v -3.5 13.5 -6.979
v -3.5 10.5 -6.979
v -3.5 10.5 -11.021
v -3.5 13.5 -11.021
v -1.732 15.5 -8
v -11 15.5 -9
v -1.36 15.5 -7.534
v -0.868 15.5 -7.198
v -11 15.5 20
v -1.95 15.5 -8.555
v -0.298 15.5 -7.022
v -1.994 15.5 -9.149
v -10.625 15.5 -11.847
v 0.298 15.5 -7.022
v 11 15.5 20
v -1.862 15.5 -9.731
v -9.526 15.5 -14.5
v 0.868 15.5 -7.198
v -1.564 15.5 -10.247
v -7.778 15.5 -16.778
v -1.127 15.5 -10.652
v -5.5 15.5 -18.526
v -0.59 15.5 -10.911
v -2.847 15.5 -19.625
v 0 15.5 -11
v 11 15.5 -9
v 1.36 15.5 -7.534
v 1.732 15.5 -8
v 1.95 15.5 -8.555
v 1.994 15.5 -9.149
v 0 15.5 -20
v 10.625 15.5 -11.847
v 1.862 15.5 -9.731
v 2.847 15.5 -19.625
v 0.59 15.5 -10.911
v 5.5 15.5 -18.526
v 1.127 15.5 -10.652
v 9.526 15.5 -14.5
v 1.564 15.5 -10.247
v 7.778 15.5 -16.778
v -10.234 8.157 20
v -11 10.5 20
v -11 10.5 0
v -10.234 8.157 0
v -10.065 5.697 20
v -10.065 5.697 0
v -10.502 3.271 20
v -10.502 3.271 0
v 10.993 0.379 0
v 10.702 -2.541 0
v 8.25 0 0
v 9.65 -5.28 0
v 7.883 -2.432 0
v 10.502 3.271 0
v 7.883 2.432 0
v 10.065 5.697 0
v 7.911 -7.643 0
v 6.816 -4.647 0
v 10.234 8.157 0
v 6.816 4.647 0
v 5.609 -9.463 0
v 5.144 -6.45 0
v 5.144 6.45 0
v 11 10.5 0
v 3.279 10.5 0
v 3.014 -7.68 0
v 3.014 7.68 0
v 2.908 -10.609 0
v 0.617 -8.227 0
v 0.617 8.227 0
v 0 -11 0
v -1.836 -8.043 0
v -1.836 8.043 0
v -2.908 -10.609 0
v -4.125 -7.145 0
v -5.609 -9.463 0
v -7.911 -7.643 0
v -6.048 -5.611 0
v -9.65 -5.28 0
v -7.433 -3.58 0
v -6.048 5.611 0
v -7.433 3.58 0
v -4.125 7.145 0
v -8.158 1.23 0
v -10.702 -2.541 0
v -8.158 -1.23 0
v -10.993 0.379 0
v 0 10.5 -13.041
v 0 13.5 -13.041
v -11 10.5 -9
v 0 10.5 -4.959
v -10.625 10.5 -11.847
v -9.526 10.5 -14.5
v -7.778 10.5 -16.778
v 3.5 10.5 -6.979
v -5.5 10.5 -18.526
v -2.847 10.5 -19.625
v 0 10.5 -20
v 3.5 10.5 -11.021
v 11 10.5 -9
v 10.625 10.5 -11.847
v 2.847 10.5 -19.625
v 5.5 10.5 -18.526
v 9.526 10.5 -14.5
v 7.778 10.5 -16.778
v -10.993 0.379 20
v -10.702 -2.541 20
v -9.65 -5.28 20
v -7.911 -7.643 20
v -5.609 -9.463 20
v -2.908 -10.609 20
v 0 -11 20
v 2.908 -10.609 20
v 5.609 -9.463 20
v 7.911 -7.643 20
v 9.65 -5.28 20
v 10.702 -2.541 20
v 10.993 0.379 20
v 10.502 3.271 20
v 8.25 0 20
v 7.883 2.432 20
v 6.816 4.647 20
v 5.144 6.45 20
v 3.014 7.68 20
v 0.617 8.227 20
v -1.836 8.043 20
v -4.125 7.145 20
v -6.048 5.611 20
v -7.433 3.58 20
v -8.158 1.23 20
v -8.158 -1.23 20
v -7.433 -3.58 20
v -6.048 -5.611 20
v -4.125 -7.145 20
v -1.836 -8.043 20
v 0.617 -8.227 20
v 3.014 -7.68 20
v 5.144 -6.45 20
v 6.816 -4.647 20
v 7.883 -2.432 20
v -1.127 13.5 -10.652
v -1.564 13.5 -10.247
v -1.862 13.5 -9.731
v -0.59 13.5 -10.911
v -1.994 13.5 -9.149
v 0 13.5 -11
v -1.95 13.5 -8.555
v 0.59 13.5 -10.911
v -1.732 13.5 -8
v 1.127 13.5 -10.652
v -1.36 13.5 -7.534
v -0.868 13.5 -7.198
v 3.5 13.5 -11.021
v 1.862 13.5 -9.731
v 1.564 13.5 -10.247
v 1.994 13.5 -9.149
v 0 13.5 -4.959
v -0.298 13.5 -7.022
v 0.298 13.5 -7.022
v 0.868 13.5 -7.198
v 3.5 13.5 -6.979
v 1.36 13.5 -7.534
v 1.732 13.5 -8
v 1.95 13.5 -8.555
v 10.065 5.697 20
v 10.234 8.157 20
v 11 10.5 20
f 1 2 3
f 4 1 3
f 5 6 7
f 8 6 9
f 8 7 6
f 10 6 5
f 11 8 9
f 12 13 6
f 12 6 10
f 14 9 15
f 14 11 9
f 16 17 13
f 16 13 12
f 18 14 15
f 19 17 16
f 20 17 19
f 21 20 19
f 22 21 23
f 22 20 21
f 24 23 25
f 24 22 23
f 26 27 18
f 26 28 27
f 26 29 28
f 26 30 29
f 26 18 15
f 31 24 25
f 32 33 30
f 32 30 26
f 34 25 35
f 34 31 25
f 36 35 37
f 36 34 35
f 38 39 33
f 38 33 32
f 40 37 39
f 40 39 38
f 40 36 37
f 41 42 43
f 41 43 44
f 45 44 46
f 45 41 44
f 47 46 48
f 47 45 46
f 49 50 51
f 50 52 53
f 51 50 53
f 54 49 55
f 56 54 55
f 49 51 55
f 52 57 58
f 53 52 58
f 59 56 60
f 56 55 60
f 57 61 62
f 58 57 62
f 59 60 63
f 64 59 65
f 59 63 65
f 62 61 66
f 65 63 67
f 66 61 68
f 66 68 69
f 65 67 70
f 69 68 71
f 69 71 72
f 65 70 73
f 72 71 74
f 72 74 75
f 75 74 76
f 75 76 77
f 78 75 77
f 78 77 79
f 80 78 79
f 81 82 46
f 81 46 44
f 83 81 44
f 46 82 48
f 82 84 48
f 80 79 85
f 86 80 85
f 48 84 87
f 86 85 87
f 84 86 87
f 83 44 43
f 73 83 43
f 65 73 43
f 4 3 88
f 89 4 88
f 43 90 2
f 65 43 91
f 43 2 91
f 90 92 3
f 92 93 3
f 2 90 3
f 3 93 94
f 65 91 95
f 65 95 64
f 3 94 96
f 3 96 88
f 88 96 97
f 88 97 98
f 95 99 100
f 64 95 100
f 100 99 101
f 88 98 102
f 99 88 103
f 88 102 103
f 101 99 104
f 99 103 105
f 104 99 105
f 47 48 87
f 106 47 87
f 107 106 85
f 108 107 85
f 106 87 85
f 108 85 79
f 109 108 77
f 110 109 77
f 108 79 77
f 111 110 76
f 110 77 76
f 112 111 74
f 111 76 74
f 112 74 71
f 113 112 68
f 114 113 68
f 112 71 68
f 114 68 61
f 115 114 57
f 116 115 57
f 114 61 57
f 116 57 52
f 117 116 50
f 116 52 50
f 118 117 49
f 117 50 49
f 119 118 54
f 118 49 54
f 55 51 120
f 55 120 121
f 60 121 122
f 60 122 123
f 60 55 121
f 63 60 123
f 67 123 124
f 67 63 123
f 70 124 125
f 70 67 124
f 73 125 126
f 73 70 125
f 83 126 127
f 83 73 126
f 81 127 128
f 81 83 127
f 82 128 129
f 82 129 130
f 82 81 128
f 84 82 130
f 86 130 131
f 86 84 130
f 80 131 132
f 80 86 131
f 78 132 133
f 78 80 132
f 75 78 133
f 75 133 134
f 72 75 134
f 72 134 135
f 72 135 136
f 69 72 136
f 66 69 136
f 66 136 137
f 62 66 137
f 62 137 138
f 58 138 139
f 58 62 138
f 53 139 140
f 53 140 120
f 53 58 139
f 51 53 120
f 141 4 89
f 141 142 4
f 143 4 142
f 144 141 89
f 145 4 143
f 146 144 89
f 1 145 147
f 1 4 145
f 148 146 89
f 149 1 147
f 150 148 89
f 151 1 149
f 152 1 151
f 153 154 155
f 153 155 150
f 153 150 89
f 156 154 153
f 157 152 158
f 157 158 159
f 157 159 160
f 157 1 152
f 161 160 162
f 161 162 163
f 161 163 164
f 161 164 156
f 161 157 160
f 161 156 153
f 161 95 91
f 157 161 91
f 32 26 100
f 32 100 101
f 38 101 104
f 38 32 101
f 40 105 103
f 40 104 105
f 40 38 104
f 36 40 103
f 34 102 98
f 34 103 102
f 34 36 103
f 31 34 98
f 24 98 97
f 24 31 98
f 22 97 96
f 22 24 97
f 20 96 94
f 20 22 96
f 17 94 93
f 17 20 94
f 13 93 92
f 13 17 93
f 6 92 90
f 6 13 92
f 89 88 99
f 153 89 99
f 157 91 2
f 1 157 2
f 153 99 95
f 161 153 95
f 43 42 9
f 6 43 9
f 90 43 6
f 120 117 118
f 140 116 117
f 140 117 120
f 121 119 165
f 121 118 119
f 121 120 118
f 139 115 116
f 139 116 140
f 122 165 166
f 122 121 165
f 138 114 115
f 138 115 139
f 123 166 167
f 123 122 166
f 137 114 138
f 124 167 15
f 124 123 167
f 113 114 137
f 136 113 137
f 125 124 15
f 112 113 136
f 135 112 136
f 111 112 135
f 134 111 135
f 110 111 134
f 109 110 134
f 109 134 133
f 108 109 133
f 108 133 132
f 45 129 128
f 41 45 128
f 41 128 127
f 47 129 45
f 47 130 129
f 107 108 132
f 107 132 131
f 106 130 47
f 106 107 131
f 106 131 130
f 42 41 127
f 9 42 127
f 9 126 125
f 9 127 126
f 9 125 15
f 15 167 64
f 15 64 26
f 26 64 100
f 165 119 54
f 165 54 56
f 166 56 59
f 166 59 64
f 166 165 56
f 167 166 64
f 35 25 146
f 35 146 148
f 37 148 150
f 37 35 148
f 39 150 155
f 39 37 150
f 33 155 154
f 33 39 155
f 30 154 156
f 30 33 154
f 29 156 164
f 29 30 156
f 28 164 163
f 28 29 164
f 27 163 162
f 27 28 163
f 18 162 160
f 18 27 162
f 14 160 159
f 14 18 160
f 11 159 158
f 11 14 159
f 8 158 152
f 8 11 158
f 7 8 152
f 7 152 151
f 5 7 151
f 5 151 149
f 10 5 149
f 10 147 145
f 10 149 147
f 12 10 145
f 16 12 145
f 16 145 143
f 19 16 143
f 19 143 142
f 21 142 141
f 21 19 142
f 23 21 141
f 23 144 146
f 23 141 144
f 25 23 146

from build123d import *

# Parameters (mm, degrees)
SKETCH1_R               = 11
SKETCH1_R_2             = 8.25
BOSS_EXTRUDE1_DEPTH     = 20
BOSS_EXTRUDE2_START     = 10.5
SKETCH2_W               = 22
SKETCH2_H               = 40
BOSS_EXTRUDE2_DEPTH     = 5
FILLET1_R               = 10
CUT_EXTRUDE1_DEPTH      = 32.356817441
CUT_EXTRUDE1_DEPTH_BACK = 32.356817441
SKETCH3_R               = 2
CUT_EXTRUDE2_DEPTH      = 3


with BuildPart() as part:
    # Sketch1 → Boss-Extrude1 (new body)
    with BuildSketch(Plane.XY):
        Circle(SKETCH1_R)
        Circle(SKETCH1_R_2, mode=Mode.SUBTRACT)
    extrude(amount=BOSS_EXTRUDE1_DEPTH)

    # Sketch2 → Boss-Extrude2 (add)
    with BuildSketch(Plane(origin=(0, 0, 0), x_dir=(1, 0, 0), z_dir=(0, 1, 0)).offset(BOSS_EXTRUDE2_START)):
        Rectangle(SKETCH2_W, SKETCH2_H)
    extrude(amount=BOSS_EXTRUDE2_DEPTH)

    # Fillet1
    # the kernel refuses this fillet: 10 mm, written as the material it adds along each edge
    with BuildSketch(Plane(origin=(-3.278719262, 10.5, 20), x_dir=(-0.7068612183411899, -0.7073522587828561, 0), z_dir=(0, 0, -1))) as fillet1_piece_1:
        with BuildLine():
            CenterArc((14.864288654, 8.855683881), FILLET1_R, 199.840435799, 42.481112875)
            Line((5.45787391, 5.461665371), (5.269745615, 5.393785))
            ThreePointArc((5.269745615, 5.393785), (2.587466503, 2.872204929), (-0.141470452, 0.141372244))
            Line((-0.141470452, 0.141372244), (0.092901804, -0.177113678))
            ThreePointArc((0.092901804, -0.177113678), (5.109599225, 1.058747731), (10.126296646, -0.177113678))
            Line((10.126296646, -0.177113678), (10.21919845, 0))
        make_face()
    extrude(amount=20)
    with BuildSketch(Plane(origin=(3.278719262, 10.5, 20), x_dir=(0.7068612183411898, -0.7073522587828562, 0), z_dir=(0, 0, -1))) as fillet1_piece_2:
        with BuildLine():
            CenterArc((14.864288654, -8.855683881), FILLET1_R, 117.678451325, 42.481112875)
            Line((5.45787391, -5.461665371), (5.269745615, -5.393785))
            ThreePointArc((5.269745615, -5.393785), (2.587466503, -2.872204929), (-0.141470452, -0.141372244))
            Line((-0.141470452, -0.141372244), (0.092901804, 0.177113678))
            ThreePointArc((0.092901804, 0.177113678), (5.109599225, -1.058747731), (10.126296646, 0.177113678))
            Line((10.126296646, 0.177113678), (10.21919845, 0))
        make_face()
    extrude(amount=20)

    # Sketch3 → Cut-Extrude1 (cut, two sides: drawn at the far end of the back side and taken through both)
    with BuildSketch(Plane.XZ.offset(-10.5).offset(-CUT_EXTRUDE1_DEPTH_BACK)):
        with Locations(Location((0, -9, 0), (0, 0, 270))):
            Circle(SKETCH3_R)
        with BuildLine():
            Line((-11, -9), (-17.508128505, -13.92083612))
            Line((-17.508128505, -13.92083612), (-14.254064253, -21.523754309))
            Line((-14.254064253, -21.523754309), (21.256045922, -20))
            Line((21.256045922, -20), (18.95789911, -14.630523296))
            Line((18.95789911, -14.630523296), (11, -9))
            ThreePointArc((11, -9), (0, -20), (-11, -9))
        make_face()
    extrude(amount=CUT_EXTRUDE1_DEPTH + CUT_EXTRUDE1_DEPTH_BACK, mode=Mode.SUBTRACT)

    # Sketch4 → Cut-Extrude2 (cut)
    with BuildSketch(Plane.XZ.offset(-10.5)):
        Polygon((3.5, -6.979274058), (0, -4.958548116), (-3.5, -6.979274058), (-3.5, -11.020725942), (0, -13.041451884), (3.5, -11.020725942), align=None)
    extrude(amount=-CUT_EXTRUDE2_DEPTH, mode=Mode.SUBTRACT)


solid = part.part
